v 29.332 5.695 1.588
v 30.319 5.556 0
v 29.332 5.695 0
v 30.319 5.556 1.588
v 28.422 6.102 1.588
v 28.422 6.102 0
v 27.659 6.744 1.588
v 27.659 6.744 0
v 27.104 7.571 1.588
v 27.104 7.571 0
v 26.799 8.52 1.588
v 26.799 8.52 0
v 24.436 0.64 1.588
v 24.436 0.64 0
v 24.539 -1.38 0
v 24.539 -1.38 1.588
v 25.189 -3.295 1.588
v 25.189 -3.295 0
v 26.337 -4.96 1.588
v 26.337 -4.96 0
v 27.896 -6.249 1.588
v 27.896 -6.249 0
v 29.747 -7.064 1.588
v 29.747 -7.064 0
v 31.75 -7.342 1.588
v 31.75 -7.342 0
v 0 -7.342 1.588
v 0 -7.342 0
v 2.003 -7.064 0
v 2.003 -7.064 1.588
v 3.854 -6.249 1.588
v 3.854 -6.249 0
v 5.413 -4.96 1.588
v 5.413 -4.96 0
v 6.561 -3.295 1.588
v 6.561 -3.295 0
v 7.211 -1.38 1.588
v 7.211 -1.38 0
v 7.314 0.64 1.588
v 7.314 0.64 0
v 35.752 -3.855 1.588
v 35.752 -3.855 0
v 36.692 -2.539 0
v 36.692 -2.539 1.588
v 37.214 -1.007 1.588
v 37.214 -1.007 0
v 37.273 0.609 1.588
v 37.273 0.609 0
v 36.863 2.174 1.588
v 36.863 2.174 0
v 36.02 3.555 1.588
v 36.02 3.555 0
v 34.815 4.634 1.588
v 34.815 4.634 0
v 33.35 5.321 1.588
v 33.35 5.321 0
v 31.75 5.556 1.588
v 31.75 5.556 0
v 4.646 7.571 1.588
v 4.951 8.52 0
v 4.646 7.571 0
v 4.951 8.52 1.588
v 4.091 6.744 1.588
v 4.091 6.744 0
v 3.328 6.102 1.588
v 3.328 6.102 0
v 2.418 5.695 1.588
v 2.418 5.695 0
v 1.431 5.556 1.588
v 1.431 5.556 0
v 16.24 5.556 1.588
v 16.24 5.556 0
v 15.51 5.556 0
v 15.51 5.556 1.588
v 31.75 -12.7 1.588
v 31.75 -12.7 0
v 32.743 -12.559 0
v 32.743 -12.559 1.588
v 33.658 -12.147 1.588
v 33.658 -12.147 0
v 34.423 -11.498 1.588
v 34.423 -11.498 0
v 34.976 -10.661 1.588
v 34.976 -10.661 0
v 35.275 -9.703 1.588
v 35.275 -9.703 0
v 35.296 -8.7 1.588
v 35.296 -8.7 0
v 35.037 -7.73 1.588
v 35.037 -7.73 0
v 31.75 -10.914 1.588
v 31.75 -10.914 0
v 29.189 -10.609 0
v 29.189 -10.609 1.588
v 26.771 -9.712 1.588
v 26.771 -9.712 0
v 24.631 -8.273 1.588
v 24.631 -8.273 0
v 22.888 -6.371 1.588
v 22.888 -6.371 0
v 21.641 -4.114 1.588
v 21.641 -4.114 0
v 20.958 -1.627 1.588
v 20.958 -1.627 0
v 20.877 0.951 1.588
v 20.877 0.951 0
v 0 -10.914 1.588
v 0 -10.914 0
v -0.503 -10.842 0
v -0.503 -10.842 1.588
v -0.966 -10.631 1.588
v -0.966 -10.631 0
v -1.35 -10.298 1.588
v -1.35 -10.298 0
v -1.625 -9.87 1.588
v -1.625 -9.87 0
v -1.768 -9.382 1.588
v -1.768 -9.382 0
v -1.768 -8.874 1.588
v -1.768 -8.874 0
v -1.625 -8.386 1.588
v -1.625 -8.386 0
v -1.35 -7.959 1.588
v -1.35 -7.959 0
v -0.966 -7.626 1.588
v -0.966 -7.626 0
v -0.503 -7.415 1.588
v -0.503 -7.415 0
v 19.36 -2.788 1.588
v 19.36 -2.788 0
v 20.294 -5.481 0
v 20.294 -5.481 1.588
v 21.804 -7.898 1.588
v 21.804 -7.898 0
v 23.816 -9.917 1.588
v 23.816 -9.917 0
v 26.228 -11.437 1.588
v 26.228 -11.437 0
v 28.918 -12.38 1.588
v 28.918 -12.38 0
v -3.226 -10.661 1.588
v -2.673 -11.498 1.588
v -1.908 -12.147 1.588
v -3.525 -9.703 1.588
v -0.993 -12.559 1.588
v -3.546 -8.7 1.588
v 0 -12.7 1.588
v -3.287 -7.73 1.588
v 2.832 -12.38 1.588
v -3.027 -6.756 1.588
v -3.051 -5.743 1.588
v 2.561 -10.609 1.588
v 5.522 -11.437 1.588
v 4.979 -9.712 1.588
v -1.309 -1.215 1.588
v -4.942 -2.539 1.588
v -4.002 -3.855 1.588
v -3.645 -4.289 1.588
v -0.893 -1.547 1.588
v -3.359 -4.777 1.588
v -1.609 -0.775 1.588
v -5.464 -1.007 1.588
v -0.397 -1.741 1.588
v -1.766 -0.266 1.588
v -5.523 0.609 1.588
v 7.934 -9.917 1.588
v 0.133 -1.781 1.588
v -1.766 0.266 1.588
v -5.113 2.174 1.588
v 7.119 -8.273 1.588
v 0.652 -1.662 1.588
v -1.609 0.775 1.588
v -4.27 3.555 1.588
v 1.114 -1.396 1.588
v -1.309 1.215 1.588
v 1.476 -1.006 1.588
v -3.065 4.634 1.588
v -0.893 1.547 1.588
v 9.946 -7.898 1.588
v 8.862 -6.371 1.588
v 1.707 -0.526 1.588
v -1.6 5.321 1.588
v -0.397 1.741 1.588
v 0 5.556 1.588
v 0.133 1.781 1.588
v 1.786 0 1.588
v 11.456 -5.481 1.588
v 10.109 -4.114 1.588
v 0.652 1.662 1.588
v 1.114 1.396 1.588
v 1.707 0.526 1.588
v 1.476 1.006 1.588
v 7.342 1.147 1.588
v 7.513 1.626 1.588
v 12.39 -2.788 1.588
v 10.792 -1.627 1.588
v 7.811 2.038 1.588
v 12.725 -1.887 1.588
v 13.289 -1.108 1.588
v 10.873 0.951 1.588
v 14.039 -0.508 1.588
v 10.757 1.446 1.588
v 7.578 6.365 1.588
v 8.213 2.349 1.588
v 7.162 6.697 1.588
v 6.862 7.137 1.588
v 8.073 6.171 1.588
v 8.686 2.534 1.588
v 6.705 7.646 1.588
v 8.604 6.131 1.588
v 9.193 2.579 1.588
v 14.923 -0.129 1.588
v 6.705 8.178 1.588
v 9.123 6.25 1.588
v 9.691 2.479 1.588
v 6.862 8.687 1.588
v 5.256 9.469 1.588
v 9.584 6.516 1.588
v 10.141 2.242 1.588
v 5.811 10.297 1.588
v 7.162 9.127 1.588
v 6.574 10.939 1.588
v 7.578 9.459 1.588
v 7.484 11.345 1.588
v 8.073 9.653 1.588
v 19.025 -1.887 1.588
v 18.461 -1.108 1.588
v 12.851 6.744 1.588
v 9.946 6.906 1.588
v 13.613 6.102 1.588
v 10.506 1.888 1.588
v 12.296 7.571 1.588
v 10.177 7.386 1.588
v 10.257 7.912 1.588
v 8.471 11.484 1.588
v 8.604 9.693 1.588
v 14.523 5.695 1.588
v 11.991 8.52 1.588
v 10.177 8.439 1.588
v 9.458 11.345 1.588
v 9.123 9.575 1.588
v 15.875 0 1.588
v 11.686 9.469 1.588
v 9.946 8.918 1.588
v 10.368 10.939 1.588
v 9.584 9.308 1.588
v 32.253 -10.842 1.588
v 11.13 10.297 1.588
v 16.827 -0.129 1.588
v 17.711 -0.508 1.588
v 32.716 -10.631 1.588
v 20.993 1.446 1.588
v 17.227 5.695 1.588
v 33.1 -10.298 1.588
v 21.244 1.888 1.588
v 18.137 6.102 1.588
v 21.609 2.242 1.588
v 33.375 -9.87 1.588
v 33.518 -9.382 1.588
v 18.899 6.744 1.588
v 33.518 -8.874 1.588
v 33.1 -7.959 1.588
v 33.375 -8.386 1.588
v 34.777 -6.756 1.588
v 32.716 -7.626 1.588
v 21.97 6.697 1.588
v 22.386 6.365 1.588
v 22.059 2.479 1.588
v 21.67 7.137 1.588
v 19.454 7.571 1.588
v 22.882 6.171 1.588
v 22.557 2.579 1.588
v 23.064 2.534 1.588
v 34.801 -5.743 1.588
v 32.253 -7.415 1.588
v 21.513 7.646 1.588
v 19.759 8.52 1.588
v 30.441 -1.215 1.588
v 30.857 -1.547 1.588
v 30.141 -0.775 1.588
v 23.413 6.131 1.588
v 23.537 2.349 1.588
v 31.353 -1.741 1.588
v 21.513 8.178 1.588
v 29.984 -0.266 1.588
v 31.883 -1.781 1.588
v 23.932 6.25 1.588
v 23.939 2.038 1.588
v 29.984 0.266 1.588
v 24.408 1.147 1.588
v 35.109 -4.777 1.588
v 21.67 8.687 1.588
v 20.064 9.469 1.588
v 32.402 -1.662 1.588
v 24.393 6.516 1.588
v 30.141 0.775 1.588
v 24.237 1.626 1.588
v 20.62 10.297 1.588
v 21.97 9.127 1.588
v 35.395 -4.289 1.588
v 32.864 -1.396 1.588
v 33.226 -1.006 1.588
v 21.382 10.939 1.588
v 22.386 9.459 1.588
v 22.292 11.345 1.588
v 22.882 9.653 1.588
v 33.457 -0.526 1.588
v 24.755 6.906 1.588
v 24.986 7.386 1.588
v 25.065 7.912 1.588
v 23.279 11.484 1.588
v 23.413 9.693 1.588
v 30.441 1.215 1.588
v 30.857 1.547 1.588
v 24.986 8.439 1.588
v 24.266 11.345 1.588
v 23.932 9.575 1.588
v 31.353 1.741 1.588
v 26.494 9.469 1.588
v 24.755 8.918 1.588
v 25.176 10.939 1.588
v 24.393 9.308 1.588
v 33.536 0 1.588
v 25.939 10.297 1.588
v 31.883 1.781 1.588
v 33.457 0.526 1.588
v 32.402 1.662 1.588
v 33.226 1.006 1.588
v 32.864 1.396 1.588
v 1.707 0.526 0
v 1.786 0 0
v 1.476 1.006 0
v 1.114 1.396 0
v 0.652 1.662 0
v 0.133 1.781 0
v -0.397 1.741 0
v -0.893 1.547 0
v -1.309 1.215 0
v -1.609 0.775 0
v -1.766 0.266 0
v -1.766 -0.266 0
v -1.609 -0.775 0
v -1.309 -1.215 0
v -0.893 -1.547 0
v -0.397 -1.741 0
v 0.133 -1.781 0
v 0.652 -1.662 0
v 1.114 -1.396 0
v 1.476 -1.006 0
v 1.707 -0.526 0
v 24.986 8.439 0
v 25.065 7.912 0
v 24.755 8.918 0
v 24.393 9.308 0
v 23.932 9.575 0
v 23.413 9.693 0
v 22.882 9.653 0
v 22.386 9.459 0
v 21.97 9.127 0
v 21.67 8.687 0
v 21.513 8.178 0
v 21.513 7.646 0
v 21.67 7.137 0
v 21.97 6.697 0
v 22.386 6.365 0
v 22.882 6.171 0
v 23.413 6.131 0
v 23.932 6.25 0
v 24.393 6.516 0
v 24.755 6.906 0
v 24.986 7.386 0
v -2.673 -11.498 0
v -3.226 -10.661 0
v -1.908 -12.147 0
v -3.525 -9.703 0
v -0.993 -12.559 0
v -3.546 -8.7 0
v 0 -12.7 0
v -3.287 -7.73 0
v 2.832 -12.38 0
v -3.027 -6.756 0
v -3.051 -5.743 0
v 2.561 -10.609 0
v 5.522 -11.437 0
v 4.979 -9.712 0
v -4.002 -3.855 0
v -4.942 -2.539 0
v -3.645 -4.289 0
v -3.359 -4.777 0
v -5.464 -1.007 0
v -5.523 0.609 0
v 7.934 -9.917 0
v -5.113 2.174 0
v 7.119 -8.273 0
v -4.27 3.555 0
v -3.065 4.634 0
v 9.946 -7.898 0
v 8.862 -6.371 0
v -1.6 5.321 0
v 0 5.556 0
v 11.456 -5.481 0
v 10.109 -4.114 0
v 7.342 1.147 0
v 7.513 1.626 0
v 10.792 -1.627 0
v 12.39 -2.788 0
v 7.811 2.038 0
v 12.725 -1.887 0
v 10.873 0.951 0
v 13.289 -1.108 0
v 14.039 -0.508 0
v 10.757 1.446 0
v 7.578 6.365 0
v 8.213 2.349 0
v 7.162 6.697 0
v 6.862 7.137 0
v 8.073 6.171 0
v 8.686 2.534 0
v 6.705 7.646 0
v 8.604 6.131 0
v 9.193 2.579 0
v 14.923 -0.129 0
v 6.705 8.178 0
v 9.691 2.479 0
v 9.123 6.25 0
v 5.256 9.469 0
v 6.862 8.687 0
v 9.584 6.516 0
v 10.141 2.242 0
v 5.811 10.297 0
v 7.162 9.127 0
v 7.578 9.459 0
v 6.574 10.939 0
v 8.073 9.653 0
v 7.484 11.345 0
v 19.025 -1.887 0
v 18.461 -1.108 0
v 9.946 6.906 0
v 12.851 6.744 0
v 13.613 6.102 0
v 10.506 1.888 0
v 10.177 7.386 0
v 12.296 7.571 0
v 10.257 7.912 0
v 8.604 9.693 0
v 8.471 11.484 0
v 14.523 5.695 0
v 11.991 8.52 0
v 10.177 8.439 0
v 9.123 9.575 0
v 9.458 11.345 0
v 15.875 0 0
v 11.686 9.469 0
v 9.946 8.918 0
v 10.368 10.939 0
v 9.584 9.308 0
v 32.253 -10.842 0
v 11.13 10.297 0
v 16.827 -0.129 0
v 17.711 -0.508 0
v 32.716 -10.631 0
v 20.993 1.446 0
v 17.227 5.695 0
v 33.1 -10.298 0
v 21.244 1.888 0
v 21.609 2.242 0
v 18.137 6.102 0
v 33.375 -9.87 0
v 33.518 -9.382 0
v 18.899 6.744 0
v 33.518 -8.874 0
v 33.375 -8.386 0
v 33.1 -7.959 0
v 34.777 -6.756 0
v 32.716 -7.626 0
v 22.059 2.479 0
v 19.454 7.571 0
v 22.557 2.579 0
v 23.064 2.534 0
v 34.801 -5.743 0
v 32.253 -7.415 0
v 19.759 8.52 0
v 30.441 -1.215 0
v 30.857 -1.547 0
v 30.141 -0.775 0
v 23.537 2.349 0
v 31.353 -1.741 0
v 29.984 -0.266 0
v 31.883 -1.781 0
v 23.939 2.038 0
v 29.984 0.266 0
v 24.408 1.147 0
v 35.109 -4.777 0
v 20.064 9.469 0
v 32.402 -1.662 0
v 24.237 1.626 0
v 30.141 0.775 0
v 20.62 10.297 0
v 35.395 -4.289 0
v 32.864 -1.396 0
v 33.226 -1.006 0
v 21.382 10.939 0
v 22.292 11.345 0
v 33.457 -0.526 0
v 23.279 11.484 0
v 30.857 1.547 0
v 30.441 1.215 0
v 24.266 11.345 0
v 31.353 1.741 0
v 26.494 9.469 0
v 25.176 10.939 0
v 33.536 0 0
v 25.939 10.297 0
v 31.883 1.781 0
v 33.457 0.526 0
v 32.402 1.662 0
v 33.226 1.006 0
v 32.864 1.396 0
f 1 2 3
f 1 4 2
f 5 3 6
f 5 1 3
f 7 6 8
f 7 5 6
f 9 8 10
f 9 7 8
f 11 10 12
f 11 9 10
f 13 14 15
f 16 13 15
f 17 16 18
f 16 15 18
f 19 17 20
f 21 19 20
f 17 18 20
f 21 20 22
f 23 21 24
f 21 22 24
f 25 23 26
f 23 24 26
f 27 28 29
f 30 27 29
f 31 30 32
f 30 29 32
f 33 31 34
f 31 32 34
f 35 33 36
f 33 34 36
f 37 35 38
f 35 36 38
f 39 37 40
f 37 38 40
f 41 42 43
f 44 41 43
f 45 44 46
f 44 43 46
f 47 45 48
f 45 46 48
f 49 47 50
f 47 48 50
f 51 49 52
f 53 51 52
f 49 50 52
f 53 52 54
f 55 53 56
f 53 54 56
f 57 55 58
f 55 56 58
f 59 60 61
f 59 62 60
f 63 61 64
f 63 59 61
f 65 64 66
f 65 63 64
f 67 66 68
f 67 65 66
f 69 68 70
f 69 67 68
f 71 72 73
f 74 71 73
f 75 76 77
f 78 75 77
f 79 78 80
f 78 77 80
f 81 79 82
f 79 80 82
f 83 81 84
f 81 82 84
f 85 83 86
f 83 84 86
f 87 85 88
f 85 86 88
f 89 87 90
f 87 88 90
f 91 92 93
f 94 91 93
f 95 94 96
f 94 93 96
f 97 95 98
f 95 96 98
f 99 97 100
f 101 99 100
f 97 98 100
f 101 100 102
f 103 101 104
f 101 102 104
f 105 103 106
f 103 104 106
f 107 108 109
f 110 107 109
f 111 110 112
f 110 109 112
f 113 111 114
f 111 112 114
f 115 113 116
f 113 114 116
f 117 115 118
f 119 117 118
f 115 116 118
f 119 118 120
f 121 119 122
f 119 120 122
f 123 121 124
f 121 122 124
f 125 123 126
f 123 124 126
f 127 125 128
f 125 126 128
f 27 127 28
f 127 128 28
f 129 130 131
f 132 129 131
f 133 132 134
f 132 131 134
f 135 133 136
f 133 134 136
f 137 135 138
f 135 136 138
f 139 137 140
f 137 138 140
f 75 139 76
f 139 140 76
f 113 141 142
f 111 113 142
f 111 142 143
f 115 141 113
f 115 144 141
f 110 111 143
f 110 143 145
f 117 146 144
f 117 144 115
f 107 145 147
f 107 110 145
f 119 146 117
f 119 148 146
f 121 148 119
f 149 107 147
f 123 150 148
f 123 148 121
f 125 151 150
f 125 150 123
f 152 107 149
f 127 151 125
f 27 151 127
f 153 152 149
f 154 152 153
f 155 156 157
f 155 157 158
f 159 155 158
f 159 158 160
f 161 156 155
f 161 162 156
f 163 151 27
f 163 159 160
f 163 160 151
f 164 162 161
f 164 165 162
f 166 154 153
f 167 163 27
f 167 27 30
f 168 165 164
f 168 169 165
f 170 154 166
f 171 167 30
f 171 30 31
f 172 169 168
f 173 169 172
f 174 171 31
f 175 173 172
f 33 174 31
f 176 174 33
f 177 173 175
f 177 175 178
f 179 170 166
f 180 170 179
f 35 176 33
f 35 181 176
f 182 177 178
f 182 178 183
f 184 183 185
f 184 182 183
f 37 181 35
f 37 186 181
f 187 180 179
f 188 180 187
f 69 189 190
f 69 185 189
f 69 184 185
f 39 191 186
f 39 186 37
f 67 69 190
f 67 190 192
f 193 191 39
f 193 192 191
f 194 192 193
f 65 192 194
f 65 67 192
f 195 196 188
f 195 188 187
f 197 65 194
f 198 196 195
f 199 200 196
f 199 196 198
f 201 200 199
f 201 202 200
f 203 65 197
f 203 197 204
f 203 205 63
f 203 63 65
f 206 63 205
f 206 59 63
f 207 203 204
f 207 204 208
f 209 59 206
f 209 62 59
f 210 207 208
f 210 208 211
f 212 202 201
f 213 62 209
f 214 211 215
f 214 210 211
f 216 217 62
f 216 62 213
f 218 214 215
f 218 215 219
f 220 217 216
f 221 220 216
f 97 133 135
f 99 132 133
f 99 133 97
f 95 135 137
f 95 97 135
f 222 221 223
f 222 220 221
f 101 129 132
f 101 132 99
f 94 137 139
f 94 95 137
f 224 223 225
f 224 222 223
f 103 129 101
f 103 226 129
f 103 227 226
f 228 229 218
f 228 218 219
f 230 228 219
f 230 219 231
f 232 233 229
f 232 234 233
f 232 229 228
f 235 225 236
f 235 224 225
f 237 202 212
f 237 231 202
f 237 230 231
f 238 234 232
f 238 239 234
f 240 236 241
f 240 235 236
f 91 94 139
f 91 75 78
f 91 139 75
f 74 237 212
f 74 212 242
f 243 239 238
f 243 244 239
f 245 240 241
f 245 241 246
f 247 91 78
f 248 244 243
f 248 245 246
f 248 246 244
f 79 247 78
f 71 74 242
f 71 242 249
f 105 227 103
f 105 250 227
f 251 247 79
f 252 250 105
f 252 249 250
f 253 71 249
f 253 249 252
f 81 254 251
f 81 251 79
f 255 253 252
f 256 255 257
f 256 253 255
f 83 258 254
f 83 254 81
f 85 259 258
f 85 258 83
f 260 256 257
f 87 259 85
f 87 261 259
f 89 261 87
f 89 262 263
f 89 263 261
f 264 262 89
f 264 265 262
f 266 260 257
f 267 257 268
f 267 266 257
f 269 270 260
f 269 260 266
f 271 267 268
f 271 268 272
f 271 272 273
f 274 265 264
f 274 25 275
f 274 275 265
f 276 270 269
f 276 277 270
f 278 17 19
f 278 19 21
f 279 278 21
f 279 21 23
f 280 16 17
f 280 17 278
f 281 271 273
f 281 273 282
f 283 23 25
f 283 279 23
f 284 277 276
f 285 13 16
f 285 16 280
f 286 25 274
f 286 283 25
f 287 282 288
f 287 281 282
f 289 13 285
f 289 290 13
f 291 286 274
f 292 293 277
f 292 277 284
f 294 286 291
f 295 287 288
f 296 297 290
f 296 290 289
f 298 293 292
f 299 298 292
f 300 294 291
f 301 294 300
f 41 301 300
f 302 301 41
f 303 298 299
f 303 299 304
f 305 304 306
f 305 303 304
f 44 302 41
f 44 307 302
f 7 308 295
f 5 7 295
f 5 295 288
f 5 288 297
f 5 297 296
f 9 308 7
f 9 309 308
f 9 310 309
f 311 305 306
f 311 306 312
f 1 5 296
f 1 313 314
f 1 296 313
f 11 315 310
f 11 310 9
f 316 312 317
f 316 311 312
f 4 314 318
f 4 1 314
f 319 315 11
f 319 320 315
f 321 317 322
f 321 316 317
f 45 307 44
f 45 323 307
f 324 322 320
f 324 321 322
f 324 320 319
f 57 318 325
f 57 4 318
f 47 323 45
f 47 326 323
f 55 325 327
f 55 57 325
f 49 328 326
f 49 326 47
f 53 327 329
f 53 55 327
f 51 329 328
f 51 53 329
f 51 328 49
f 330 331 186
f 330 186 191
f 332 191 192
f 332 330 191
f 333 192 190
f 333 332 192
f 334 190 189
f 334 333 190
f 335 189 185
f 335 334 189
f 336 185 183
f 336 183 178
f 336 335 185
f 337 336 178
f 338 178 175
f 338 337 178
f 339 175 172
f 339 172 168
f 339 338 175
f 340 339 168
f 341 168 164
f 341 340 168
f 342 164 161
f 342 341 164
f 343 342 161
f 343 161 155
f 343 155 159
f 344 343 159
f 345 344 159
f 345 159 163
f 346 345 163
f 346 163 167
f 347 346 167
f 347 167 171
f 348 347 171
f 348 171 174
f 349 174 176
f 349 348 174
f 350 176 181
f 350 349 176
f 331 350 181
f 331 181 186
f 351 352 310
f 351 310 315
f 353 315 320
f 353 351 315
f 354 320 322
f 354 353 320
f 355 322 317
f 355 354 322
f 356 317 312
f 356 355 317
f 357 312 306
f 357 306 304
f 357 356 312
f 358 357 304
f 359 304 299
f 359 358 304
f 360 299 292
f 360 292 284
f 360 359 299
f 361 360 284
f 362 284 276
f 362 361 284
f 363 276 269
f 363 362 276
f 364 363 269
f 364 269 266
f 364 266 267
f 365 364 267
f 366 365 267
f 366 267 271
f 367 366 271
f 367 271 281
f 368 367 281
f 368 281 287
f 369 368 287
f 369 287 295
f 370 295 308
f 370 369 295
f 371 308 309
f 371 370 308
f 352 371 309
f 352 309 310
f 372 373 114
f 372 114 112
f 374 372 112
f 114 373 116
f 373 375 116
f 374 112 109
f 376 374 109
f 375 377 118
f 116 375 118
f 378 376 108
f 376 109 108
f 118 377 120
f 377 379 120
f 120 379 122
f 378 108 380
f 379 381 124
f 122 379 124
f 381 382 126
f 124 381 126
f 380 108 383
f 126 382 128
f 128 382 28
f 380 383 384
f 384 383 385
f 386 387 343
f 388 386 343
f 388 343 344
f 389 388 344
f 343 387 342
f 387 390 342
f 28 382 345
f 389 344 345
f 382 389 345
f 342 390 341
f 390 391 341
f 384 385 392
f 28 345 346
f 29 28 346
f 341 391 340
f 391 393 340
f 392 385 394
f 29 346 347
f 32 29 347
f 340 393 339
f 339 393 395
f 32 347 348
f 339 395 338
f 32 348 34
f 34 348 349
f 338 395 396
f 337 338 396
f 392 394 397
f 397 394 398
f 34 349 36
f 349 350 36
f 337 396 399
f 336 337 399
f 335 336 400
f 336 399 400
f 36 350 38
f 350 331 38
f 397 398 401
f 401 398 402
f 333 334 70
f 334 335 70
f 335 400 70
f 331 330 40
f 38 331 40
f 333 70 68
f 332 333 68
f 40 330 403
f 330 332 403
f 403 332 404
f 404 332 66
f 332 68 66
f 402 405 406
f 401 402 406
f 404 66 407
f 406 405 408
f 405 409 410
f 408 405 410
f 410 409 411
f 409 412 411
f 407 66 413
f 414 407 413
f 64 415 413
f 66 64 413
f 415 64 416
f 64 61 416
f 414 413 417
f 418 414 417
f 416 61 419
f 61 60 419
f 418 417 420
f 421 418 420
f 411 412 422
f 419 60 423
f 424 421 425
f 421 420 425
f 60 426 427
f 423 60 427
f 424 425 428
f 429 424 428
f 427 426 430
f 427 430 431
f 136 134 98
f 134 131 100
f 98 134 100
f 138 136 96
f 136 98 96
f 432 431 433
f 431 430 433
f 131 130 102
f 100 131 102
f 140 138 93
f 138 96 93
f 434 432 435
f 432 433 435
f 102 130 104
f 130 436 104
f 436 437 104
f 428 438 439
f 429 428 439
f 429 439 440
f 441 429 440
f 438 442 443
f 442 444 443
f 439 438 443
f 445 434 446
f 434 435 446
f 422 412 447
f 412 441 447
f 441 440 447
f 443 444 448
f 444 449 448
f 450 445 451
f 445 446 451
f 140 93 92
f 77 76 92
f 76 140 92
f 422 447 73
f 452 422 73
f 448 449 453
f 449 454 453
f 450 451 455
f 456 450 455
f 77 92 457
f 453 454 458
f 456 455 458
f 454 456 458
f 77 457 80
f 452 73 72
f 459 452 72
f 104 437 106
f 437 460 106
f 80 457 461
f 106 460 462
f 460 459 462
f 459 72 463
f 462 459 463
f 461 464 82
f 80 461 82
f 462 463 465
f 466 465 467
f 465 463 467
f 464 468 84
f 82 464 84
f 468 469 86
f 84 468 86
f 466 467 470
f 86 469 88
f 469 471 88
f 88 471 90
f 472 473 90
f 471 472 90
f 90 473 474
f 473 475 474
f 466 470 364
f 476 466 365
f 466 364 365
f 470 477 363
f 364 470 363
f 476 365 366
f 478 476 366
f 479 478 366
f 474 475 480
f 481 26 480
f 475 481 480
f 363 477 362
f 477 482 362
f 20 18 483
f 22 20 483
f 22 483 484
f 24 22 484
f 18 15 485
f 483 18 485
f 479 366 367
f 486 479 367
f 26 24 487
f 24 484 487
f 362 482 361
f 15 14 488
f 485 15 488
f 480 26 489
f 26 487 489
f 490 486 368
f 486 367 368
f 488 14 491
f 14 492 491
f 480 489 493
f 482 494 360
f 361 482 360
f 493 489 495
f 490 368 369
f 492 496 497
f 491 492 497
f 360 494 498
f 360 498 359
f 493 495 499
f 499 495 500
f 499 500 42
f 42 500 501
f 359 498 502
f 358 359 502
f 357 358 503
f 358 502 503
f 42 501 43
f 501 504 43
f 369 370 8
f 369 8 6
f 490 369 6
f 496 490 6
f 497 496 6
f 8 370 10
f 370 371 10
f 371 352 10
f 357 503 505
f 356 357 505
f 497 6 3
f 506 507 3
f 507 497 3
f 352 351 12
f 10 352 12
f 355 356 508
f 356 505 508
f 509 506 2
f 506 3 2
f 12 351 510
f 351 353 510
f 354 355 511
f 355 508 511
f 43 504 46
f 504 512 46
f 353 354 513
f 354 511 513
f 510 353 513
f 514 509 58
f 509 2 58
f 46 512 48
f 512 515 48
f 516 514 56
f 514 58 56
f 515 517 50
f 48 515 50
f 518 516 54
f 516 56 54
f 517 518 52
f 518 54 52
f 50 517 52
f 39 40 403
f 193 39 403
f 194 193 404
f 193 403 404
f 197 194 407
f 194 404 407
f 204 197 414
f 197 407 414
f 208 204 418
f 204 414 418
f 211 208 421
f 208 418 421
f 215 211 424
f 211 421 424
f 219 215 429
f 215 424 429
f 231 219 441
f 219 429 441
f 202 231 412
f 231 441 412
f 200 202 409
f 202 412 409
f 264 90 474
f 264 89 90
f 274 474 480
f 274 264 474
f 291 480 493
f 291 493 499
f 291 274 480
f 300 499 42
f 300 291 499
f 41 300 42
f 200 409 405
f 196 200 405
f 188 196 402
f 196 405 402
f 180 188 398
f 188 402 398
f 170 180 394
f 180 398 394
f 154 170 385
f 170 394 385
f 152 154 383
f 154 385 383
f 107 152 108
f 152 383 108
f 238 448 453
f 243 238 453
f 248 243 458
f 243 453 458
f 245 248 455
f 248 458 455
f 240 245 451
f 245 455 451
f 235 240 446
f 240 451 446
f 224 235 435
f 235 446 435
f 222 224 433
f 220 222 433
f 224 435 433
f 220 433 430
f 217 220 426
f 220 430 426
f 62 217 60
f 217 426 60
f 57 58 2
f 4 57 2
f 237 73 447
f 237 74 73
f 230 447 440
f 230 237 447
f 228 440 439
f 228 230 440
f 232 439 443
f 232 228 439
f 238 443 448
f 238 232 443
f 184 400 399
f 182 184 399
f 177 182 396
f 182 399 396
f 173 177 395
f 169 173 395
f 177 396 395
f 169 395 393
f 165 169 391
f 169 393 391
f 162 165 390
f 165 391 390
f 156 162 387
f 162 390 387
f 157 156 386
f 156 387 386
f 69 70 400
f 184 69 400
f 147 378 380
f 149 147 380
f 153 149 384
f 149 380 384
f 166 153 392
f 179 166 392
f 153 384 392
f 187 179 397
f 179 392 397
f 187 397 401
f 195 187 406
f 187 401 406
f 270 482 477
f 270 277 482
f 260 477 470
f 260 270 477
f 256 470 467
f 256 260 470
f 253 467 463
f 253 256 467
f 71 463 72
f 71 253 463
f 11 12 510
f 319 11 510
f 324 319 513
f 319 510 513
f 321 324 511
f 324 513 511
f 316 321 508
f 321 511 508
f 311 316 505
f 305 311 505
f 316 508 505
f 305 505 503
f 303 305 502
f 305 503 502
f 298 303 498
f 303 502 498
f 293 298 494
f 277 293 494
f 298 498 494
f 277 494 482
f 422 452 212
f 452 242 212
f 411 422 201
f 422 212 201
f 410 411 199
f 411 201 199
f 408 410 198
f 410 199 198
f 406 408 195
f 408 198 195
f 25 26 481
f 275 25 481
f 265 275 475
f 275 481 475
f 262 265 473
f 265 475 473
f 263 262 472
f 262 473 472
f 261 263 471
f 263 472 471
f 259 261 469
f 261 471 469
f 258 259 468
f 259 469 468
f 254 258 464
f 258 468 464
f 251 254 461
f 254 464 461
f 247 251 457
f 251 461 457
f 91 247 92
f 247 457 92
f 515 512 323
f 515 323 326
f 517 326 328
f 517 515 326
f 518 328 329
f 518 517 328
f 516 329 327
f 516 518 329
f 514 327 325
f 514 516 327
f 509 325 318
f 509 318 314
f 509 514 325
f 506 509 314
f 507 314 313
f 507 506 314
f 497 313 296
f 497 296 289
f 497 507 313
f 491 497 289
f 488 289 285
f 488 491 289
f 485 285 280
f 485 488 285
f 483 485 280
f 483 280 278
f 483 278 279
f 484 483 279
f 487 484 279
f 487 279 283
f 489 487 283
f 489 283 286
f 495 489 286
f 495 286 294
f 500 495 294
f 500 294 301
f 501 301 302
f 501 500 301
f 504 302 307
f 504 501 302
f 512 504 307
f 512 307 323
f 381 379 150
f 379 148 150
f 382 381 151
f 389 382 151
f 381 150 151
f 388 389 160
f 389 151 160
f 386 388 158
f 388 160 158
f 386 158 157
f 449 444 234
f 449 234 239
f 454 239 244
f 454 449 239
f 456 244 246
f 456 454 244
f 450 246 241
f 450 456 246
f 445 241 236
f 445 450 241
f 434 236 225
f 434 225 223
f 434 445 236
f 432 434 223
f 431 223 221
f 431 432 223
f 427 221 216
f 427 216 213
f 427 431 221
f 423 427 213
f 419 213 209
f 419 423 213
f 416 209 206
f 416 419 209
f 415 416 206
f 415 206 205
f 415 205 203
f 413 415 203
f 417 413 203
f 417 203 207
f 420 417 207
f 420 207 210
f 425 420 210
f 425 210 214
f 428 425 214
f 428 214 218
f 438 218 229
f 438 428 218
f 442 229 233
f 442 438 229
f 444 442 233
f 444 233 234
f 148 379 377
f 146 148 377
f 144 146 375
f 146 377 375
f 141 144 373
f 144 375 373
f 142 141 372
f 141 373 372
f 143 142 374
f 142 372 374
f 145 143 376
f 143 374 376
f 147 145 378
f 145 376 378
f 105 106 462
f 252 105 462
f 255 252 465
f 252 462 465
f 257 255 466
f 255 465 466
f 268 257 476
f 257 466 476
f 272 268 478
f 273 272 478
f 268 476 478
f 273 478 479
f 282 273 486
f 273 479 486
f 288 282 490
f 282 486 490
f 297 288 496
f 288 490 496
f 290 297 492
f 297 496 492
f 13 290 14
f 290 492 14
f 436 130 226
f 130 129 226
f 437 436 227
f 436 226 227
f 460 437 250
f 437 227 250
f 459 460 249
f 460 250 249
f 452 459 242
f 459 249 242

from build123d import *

# Parameters (mm, degrees)
SKETCH1_R           = 1.7859375
BOSS_EXTRUDE1_DEPTH = 1.5875
FILLET1_R           = 3.571875


with BuildPart() as part:
    # Sketch1 → Boss-Extrude1 (new body)
    with BuildSketch(Plane.XY):
        with BuildLine():
            ThreePointArc((31.75, -12.7), (35.321875, -9.128125), (31.75, -5.55625))
            ThreePointArc((31.75, -5.55625), (37.30625, 0), (31.75, 5.55625))
            Line((31.75, 5.55625), (25.964019559, 5.55625))
            ThreePointArc((25.964019559, 5.55625), (23.279229109, 11.484009389), (20.594438658, 5.55625))
            Line((20.594438658, 5.55625), (11.155561342, 5.55625))
            ThreePointArc((11.155561342, 5.55625), (8.470770891, 11.484009389), (5.785980441, 5.55625))
            Line((5.785980441, 5.55625), (0, 5.55625))
            ThreePointArc((0, 5.55625), (-5.55625, 0), (0, -5.55625))
            ThreePointArc((0, -5.55625), (-3.571875, -9.128125), (0, -12.7))
            ThreePointArc((0, -12.7), (8.980256121, -8.980256121), (12.7, 0))
            Line((12.7, 0), (19.05, 0))
            ThreePointArc((19.05, 0), (22.769743879, -8.980256121), (31.75, -12.7))
        make_face()
        with BuildLine():
            ThreePointArc((0, -10.9140625), (-1.7859375, -9.128125), (0, -7.3421875))
            ThreePointArc((0, -7.3421875), (5.413228446, -4.960309977), (7.31424826, 0.639913805))
            ThreePointArc((7.31424826, 0.639913805), (8.937735019, 2.574709983), (10.872531197, 0.951223224))
            ThreePointArc((10.872531197, 0.951223224), (8.046690934, -7.37343375), (0, -10.9140625))
        make_face(mode=Mode.SUBTRACT)
        with BuildLine():
            ThreePointArc((24.43575174, 0.639913805), (26.336771554, -4.960309977), (31.75, -7.3421875))
            ThreePointArc((31.75, -7.3421875), (33.5359375, -9.128125), (31.75, -10.9140625))
            ThreePointArc((31.75, -10.9140625), (23.703309066, -7.37343375), (20.877468803, 0.951223224))
            ThreePointArc((20.877468803, 0.951223224), (22.812264981, 2.574709983), (24.43575174, 0.639913805))
        make_face(mode=Mode.SUBTRACT)
        Circle(SKETCH1_R, mode=Mode.SUBTRACT)
        with Locations((8.470770891, 7.912134389)):
            Circle(SKETCH1_R, mode=Mode.SUBTRACT)
        with Locations((31.75, 0)):
            Circle(SKETCH1_R, mode=Mode.SUBTRACT)
        with Locations((23.279229109, 7.912134389)):
            Circle(SKETCH1_R, mode=Mode.SUBTRACT)
    extrude(amount=BOSS_EXTRUDE1_DEPTH)

    # Fillet1
    fillet1_edges = [part.edges().sort_by_distance(p)[0] for p in [
        (31.75, -5.55625, 0.79375),
        (19.05, 0, 0.79375),
        (12.7, 0, 0.79375),
        (0, -5.55625, 0.79375),
        (20.594438658, 5.55625, 0.79375),
        (25.964019559, 5.55625, 0.79375),
        (5.785980441, 5.55625, 0.79375),
        (11.155561342, 5.55625, 0.79375),
    ]]
    fillet(fillet1_edges, radius=FILLET1_R - 0.0001)  # a hair under: the kernel refuses the full size


solid = part.part
